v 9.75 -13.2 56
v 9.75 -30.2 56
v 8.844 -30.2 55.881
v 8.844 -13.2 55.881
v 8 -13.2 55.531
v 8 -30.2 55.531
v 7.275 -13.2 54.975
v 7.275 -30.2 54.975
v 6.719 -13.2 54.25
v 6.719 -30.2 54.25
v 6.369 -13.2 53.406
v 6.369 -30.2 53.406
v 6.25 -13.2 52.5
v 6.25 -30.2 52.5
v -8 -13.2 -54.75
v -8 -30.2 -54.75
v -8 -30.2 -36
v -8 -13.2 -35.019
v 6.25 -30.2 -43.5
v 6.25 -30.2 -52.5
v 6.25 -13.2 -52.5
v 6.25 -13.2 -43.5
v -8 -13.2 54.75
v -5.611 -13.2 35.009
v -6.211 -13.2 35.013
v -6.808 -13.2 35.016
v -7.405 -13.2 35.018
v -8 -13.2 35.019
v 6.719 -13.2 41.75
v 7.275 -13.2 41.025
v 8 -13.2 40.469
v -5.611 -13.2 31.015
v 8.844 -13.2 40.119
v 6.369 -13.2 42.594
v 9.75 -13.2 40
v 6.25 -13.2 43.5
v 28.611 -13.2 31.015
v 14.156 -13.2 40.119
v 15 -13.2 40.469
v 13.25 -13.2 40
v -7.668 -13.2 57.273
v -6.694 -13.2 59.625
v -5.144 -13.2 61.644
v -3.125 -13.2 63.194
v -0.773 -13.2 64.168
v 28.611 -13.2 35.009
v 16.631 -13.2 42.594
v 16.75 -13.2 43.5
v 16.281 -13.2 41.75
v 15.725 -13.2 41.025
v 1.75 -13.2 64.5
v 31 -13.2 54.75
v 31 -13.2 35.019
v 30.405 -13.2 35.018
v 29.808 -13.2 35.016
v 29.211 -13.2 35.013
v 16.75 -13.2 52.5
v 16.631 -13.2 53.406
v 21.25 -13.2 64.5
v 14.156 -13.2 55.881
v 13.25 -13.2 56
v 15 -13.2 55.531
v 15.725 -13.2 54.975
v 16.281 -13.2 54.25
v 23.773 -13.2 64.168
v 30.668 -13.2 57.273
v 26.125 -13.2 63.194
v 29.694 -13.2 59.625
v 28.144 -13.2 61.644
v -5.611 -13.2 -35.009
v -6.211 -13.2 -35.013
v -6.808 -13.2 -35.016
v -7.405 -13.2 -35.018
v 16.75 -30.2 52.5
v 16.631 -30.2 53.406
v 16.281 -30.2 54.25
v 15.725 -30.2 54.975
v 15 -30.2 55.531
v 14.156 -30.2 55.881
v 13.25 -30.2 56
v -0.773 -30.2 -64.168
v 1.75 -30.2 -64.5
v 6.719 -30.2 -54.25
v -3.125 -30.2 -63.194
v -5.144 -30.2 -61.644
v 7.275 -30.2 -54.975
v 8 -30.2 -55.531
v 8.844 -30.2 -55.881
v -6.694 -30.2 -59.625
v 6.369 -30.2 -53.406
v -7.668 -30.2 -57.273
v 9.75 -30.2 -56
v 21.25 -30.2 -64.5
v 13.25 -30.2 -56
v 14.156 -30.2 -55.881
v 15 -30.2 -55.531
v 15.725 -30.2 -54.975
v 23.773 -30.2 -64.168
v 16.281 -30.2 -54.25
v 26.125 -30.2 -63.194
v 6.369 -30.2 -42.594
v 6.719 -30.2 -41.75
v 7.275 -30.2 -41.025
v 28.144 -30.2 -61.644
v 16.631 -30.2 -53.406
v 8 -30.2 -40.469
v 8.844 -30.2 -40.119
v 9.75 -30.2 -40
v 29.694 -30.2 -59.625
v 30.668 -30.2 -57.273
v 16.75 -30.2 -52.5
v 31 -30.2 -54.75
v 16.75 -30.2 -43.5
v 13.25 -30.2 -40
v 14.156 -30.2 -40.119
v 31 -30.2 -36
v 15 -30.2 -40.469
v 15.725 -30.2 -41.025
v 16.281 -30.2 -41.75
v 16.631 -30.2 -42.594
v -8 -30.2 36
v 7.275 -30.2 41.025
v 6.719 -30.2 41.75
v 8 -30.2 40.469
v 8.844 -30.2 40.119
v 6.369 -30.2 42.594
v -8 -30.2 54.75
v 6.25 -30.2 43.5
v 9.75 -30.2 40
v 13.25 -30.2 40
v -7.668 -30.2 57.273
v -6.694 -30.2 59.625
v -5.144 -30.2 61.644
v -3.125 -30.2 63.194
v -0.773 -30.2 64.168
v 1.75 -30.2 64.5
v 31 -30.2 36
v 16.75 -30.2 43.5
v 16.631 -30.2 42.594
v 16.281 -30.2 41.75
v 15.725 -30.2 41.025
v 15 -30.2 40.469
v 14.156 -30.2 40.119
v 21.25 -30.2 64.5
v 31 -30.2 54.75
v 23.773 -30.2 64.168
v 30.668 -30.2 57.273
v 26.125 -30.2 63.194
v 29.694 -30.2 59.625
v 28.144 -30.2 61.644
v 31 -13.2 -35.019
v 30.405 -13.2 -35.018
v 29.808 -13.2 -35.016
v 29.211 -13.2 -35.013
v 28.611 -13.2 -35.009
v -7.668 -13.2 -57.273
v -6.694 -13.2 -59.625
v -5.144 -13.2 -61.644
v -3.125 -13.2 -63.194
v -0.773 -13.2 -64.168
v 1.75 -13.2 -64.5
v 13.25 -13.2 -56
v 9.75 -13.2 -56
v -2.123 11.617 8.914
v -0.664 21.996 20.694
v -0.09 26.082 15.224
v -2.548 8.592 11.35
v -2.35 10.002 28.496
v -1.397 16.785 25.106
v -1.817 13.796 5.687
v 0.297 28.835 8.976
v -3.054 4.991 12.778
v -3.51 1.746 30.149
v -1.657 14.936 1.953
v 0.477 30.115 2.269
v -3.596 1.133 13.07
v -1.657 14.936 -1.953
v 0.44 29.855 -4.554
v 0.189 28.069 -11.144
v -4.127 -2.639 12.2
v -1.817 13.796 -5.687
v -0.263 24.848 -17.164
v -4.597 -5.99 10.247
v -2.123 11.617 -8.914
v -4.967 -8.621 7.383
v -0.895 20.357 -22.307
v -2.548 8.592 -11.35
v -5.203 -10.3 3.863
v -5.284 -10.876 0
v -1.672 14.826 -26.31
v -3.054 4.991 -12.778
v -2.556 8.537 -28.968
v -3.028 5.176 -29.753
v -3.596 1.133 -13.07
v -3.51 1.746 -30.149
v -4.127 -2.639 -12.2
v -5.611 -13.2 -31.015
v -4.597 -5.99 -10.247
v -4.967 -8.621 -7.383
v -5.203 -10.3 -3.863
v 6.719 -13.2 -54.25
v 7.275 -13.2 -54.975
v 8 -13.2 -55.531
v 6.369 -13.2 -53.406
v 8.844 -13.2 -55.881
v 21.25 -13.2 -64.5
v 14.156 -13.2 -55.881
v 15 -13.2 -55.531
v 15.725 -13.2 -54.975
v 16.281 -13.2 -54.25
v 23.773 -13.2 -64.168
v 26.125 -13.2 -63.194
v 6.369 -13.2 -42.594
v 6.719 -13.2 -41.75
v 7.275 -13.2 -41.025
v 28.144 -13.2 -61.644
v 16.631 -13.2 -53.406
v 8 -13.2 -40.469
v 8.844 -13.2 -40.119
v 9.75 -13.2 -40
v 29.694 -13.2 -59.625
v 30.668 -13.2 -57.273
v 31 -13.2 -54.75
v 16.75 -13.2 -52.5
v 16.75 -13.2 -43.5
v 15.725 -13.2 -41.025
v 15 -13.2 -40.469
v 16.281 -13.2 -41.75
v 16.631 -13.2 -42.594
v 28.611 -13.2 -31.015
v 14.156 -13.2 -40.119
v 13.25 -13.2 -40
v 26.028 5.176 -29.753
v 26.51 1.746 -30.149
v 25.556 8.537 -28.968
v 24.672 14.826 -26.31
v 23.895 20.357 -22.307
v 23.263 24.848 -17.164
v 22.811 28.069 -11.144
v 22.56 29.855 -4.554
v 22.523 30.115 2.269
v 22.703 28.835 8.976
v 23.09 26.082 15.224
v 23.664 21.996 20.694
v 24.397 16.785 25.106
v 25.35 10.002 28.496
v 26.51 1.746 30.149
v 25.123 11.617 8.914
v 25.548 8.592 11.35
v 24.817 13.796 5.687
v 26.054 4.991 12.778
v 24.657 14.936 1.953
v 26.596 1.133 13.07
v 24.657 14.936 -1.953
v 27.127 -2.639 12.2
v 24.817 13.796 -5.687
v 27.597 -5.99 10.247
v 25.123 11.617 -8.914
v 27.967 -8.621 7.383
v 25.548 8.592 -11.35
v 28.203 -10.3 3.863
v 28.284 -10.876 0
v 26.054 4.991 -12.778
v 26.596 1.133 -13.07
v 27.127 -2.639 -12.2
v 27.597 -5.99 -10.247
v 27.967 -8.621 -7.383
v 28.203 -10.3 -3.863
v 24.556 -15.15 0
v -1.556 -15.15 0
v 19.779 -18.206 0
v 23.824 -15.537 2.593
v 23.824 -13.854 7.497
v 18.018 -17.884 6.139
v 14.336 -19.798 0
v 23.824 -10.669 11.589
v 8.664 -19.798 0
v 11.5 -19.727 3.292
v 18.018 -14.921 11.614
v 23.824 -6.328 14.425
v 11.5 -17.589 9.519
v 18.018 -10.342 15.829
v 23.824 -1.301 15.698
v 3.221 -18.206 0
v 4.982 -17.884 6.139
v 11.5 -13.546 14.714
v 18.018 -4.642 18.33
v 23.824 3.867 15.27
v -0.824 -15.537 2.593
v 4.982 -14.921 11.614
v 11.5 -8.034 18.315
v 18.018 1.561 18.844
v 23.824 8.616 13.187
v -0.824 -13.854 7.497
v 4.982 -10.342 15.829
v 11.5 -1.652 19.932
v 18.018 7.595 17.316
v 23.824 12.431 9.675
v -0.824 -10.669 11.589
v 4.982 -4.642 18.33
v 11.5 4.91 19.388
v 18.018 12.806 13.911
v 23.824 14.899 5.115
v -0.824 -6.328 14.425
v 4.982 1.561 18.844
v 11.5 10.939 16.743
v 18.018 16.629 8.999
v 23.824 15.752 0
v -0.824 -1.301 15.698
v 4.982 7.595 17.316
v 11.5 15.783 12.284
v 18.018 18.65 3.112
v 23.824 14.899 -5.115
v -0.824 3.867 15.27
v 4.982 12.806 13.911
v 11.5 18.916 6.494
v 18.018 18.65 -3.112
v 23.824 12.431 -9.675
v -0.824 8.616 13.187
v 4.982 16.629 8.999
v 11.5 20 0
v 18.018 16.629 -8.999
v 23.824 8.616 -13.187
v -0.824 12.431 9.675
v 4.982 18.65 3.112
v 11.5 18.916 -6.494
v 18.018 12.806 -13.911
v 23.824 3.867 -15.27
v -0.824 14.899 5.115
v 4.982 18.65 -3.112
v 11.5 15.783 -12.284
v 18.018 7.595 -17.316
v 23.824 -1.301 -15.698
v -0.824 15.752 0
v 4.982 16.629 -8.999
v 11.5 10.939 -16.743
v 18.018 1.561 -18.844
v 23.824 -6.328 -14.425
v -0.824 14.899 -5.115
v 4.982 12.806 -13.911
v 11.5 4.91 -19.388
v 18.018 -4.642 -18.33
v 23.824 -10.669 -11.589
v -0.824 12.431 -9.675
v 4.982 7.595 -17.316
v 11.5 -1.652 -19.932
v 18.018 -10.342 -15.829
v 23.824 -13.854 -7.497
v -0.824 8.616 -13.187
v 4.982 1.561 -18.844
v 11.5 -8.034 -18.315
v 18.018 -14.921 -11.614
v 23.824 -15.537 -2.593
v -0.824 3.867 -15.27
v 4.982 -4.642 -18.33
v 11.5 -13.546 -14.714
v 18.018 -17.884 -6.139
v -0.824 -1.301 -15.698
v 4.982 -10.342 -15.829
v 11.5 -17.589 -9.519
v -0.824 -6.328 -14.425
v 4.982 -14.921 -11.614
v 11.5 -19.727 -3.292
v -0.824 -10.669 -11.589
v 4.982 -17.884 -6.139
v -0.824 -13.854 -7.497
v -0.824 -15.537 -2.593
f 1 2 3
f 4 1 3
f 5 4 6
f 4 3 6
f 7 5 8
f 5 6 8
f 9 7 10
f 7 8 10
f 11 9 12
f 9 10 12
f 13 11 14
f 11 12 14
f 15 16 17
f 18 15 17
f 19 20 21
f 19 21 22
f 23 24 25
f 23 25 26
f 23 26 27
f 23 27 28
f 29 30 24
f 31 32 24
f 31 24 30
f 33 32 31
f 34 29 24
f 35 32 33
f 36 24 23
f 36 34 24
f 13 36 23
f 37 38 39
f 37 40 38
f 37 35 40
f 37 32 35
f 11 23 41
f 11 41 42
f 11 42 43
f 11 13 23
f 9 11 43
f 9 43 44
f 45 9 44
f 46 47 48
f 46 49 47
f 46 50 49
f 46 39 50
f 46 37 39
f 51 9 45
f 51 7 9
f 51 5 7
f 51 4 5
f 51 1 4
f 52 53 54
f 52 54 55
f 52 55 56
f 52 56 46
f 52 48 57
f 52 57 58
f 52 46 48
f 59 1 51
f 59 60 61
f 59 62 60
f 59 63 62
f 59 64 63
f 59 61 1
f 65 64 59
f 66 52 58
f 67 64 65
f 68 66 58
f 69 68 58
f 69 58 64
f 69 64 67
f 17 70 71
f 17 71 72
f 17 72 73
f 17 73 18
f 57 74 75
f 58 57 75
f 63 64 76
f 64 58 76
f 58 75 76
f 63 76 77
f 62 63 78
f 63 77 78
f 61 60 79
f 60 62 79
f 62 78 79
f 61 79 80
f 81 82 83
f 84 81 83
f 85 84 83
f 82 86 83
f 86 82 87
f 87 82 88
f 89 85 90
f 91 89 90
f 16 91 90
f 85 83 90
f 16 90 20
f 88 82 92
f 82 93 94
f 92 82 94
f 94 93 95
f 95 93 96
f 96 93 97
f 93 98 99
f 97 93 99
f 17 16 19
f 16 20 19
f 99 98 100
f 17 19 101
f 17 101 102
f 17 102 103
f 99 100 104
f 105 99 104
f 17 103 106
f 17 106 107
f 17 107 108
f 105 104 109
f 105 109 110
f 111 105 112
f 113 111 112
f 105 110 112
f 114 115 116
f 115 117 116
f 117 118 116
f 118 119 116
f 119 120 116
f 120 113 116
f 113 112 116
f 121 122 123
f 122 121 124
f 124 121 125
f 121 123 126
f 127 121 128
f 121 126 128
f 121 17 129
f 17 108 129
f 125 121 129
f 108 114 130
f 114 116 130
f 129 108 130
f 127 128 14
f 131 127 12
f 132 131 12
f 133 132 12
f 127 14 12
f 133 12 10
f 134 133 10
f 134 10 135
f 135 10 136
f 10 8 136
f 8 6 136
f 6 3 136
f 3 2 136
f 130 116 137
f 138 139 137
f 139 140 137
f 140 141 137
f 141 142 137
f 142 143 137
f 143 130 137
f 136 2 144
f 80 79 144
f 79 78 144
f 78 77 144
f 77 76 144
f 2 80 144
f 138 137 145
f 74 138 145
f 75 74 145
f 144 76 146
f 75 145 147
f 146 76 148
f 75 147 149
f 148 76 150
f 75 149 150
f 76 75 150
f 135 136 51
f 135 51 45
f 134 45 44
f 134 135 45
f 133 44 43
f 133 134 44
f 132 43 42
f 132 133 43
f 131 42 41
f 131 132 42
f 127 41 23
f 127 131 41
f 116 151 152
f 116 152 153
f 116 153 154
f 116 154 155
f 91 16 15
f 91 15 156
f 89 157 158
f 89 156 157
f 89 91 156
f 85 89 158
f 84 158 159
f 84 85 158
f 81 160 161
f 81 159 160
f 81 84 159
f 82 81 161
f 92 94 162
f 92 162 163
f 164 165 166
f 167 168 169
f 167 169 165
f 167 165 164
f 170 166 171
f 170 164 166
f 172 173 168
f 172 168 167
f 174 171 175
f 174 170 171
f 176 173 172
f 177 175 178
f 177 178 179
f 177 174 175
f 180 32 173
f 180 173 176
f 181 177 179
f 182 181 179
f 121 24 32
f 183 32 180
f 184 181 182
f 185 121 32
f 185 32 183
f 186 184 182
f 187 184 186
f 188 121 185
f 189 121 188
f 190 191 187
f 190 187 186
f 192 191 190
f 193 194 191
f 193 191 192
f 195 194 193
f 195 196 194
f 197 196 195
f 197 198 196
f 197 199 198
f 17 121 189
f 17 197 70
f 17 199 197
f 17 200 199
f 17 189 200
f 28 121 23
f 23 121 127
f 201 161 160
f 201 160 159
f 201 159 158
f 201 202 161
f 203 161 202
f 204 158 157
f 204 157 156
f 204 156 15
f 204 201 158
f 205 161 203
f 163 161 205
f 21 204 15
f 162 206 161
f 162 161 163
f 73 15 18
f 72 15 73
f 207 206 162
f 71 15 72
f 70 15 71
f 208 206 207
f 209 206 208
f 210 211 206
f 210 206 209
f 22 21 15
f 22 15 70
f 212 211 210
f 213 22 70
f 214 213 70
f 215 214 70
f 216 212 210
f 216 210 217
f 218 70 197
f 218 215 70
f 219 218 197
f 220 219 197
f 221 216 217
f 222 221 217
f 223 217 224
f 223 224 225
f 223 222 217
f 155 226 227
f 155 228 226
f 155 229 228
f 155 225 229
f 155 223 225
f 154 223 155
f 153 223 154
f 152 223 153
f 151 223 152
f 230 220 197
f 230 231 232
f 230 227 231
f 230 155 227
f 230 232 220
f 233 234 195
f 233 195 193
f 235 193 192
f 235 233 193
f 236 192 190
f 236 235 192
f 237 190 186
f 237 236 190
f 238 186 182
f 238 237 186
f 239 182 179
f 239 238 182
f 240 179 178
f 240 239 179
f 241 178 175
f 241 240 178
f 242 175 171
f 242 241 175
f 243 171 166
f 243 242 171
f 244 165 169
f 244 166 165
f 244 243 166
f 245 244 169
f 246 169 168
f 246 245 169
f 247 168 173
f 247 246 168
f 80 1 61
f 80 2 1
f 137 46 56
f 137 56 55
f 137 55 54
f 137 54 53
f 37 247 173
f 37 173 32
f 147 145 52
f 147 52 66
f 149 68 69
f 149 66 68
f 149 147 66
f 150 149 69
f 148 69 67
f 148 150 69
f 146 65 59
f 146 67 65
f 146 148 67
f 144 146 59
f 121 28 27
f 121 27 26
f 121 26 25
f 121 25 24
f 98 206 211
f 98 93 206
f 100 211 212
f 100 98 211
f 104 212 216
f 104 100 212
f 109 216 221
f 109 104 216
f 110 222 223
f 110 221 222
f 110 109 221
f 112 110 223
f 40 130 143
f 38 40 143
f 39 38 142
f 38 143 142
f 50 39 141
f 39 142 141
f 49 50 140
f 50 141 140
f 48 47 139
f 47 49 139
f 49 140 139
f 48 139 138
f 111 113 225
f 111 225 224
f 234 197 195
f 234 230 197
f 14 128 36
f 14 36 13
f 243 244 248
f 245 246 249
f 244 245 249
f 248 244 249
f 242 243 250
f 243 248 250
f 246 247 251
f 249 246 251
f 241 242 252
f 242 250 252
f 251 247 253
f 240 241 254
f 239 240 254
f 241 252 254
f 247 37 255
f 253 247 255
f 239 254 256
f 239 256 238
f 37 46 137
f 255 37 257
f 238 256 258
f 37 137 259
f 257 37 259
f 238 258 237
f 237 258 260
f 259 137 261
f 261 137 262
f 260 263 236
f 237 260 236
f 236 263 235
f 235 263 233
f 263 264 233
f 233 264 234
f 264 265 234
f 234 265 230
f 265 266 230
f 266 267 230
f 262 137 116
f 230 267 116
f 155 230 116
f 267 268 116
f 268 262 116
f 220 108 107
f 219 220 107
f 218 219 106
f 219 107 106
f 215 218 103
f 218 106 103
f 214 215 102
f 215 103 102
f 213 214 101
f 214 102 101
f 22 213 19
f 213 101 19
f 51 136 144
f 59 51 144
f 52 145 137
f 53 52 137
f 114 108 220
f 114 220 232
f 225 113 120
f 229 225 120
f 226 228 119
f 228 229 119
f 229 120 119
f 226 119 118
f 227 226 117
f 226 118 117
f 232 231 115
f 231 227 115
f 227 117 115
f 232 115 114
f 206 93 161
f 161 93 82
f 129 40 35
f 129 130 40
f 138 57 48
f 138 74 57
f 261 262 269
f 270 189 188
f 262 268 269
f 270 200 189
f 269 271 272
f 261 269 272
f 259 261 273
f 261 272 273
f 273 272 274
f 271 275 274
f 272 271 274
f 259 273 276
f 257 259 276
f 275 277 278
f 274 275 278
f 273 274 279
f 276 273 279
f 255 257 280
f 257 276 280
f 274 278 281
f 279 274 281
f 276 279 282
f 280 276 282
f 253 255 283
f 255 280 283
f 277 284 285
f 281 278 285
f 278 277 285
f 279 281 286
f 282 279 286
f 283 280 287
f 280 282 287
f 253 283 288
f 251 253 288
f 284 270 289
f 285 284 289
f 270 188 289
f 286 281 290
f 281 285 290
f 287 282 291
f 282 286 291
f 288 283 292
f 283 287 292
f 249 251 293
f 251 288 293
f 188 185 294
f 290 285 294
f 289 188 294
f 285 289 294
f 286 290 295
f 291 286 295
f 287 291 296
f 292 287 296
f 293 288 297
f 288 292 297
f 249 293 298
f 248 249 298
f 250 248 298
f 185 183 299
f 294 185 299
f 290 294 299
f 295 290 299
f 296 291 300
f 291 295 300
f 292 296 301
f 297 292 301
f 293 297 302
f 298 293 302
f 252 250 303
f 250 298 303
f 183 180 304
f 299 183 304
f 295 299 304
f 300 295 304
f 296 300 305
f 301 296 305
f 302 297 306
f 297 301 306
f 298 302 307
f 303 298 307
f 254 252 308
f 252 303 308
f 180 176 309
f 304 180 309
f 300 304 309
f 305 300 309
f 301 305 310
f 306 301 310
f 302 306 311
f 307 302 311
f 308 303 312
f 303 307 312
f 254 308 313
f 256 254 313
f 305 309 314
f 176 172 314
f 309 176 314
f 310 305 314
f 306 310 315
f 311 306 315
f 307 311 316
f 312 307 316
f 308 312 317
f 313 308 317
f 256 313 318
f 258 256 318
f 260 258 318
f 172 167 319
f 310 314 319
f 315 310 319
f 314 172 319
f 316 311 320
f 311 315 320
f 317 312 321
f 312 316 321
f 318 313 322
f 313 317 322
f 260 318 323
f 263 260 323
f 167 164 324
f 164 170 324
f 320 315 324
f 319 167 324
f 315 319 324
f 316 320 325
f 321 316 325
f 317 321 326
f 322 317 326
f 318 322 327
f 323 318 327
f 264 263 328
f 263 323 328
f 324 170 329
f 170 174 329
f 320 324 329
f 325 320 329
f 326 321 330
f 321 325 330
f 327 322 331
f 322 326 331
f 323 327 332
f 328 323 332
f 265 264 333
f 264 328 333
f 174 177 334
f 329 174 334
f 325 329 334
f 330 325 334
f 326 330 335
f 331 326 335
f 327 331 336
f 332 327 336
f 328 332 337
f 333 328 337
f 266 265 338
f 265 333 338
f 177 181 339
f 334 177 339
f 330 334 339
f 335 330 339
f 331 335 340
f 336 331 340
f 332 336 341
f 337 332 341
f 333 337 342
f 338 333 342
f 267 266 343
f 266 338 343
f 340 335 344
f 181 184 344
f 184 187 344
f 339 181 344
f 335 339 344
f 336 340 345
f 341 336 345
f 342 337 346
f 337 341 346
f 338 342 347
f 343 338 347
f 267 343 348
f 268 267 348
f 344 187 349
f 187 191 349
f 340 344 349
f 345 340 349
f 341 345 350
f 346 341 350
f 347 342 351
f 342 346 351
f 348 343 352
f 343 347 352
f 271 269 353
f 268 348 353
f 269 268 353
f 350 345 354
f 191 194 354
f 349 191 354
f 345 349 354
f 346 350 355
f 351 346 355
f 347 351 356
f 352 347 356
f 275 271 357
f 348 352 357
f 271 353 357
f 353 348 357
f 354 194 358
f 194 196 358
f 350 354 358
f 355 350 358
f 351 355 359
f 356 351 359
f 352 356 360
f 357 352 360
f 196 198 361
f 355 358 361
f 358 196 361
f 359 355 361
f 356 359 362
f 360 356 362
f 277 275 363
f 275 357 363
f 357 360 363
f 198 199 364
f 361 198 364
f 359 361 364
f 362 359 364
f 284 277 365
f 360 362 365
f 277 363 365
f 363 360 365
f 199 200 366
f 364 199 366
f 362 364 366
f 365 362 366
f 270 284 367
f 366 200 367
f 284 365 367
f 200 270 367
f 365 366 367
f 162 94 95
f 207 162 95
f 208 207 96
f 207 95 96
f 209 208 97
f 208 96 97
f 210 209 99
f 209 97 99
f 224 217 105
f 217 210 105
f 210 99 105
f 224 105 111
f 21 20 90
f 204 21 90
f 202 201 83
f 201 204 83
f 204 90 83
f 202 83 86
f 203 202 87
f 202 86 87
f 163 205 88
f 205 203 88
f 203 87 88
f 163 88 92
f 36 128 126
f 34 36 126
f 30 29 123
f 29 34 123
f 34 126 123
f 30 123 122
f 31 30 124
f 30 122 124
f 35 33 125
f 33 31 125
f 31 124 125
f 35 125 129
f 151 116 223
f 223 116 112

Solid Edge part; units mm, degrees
sketch "Sketch1" plane through (0, -30.2, 0) normal (0, -1, 0) x (1, 0, 0)
  line L0 (-8, -54.75) -> (-8, 54.75)
  arc A0 (-8, 54.75) -> (1.75, 64.5) centre (1.75, 54.75) cw
  line L1 (1.75, 64.5) -> (21.25, 64.5)
  arc A1 (21.25, 64.5) -> (31, 54.75) centre (21.25, 54.75) cw
  line L2 (31, 54.75) -> (31, -54.75)
  arc A2 (31, -54.75) -> (21.25, -64.5) centre (21.25, -54.75) cw
  line L3 (21.25, -64.5) -> (1.75, -64.5)
  arc A3 (1.75, -64.5) -> (-8, -54.75) centre (1.75, -54.75) cw
  line L4 (6.25, 43.5) -> (6.25, 52.5)
  arc A4 (6.25, 52.5) -> (9.75, 56) centre (9.75, 52.5) cw
  line L5 (9.75, 56) -> (13.25, 56)
  arc A5 (13.25, 56) -> (16.75, 52.5) centre (13.25, 52.5) cw
  line L6 (16.75, 52.5) -> (16.75, 43.5)
  arc A6 (16.75, 43.5) -> (13.25, 40) centre (13.25, 43.5) cw
  line L7 (13.25, 40) -> (9.75, 40)
  arc A7 (9.75, 40) -> (6.25, 43.5) centre (9.75, 43.5) cw
  arc A8 (6.25, -43.5) -> (9.75, -40) centre (9.75, -43.5) cw
  line L8 (9.75, -40) -> (13.25, -40)
  arc A9 (13.25, -40) -> (16.75, -43.5) centre (13.25, -43.5) cw
  line L9 (16.75, -43.5) -> (16.75, -52.5)
  arc A10 (16.75, -52.5) -> (13.25, -56) centre (13.25, -52.5) cw
  line L10 (13.25, -56) -> (9.75, -56)
  arc A11 (9.75, -56) -> (6.25, -52.5) centre (9.75, -52.5) cw
  line L11 (6.25, -52.5) -> (6.25, -43.5)
extrude "ExtrudedProtrusion_1" add sketch "Sketch1" against normal blind 17
sketch "Sketch2" plane through (11.5, 0, 0) normal (1, 0, 0) x (0, 1, 0)
  line L0 (-30.2, 32) -> (-30.2, -32)
  line L1 (-30.2, -32) -> (1.7464, -30.1495)
  arc A0 (1.7464, -30.1495) -> (1.7464, 30.1495) centre (0, 0) ccw
  line L2 (1.7464, 30.1495) -> (-30.2, 32)
extrude "ExtrudedProtrusion_2" add sketch "Sketch2" against normal blind 19.5 and the other way blind 19.5
sketch "Sketch3" plane through (31, 0, 0) normal (1, 0, 0) x (0, 1, 0)
  line L0 (-30.2, 36) -> (1.9707, 34.1432)
  arc A0 (1.9707, 34.1432) -> (1.9707, -34.1432) centre (0, 0) cw
  line L1 (1.9707, -34.1432) -> (-30.2, -36)
  line L2 (-30.2, -36) -> (-30.2, 36)
revolve "RevolvedCutout_1" cut sketch "Sketch3" angle 8 about axis through (31, -30.2, -36) along (0, 0, 1)
sketch "Sketch4" plane through (-8, 0, 0) normal (1, 0, 0) x (0, 1, 0)
  line L0 (-30.2, 36) -> (1.9707, 34.1432)
  arc A0 (1.9707, 34.1432) -> (1.9707, -34.1432) centre (0, 0) cw
  line L1 (1.9707, -34.1432) -> (-30.2, -36)
  line L2 (-30.2, -36) -> (-30.2, 36)
revolve "RevolvedCutout_2" cut sketch "Sketch4" angle 8 about axis through (-8, -30.2, -36) along (0, 0, -1)
sketch "Sketch5" plane through (0, 0, 0) normal (0, 0, 1) x (1, 0, 0)
  arc A0 (31.5, 0) -> (-8.5, 0) centre (11.5, 0) cw
  line L0 (-8.5, 0) -> (31.5, 0)
revolve "RevolvedCutout1" cut sketch "Sketch5" angle 360 about axis through (-8.5, 0, 0) along (1, 0, 0)
properties part number "UCP201 GB/T7810-1995_PART5"
